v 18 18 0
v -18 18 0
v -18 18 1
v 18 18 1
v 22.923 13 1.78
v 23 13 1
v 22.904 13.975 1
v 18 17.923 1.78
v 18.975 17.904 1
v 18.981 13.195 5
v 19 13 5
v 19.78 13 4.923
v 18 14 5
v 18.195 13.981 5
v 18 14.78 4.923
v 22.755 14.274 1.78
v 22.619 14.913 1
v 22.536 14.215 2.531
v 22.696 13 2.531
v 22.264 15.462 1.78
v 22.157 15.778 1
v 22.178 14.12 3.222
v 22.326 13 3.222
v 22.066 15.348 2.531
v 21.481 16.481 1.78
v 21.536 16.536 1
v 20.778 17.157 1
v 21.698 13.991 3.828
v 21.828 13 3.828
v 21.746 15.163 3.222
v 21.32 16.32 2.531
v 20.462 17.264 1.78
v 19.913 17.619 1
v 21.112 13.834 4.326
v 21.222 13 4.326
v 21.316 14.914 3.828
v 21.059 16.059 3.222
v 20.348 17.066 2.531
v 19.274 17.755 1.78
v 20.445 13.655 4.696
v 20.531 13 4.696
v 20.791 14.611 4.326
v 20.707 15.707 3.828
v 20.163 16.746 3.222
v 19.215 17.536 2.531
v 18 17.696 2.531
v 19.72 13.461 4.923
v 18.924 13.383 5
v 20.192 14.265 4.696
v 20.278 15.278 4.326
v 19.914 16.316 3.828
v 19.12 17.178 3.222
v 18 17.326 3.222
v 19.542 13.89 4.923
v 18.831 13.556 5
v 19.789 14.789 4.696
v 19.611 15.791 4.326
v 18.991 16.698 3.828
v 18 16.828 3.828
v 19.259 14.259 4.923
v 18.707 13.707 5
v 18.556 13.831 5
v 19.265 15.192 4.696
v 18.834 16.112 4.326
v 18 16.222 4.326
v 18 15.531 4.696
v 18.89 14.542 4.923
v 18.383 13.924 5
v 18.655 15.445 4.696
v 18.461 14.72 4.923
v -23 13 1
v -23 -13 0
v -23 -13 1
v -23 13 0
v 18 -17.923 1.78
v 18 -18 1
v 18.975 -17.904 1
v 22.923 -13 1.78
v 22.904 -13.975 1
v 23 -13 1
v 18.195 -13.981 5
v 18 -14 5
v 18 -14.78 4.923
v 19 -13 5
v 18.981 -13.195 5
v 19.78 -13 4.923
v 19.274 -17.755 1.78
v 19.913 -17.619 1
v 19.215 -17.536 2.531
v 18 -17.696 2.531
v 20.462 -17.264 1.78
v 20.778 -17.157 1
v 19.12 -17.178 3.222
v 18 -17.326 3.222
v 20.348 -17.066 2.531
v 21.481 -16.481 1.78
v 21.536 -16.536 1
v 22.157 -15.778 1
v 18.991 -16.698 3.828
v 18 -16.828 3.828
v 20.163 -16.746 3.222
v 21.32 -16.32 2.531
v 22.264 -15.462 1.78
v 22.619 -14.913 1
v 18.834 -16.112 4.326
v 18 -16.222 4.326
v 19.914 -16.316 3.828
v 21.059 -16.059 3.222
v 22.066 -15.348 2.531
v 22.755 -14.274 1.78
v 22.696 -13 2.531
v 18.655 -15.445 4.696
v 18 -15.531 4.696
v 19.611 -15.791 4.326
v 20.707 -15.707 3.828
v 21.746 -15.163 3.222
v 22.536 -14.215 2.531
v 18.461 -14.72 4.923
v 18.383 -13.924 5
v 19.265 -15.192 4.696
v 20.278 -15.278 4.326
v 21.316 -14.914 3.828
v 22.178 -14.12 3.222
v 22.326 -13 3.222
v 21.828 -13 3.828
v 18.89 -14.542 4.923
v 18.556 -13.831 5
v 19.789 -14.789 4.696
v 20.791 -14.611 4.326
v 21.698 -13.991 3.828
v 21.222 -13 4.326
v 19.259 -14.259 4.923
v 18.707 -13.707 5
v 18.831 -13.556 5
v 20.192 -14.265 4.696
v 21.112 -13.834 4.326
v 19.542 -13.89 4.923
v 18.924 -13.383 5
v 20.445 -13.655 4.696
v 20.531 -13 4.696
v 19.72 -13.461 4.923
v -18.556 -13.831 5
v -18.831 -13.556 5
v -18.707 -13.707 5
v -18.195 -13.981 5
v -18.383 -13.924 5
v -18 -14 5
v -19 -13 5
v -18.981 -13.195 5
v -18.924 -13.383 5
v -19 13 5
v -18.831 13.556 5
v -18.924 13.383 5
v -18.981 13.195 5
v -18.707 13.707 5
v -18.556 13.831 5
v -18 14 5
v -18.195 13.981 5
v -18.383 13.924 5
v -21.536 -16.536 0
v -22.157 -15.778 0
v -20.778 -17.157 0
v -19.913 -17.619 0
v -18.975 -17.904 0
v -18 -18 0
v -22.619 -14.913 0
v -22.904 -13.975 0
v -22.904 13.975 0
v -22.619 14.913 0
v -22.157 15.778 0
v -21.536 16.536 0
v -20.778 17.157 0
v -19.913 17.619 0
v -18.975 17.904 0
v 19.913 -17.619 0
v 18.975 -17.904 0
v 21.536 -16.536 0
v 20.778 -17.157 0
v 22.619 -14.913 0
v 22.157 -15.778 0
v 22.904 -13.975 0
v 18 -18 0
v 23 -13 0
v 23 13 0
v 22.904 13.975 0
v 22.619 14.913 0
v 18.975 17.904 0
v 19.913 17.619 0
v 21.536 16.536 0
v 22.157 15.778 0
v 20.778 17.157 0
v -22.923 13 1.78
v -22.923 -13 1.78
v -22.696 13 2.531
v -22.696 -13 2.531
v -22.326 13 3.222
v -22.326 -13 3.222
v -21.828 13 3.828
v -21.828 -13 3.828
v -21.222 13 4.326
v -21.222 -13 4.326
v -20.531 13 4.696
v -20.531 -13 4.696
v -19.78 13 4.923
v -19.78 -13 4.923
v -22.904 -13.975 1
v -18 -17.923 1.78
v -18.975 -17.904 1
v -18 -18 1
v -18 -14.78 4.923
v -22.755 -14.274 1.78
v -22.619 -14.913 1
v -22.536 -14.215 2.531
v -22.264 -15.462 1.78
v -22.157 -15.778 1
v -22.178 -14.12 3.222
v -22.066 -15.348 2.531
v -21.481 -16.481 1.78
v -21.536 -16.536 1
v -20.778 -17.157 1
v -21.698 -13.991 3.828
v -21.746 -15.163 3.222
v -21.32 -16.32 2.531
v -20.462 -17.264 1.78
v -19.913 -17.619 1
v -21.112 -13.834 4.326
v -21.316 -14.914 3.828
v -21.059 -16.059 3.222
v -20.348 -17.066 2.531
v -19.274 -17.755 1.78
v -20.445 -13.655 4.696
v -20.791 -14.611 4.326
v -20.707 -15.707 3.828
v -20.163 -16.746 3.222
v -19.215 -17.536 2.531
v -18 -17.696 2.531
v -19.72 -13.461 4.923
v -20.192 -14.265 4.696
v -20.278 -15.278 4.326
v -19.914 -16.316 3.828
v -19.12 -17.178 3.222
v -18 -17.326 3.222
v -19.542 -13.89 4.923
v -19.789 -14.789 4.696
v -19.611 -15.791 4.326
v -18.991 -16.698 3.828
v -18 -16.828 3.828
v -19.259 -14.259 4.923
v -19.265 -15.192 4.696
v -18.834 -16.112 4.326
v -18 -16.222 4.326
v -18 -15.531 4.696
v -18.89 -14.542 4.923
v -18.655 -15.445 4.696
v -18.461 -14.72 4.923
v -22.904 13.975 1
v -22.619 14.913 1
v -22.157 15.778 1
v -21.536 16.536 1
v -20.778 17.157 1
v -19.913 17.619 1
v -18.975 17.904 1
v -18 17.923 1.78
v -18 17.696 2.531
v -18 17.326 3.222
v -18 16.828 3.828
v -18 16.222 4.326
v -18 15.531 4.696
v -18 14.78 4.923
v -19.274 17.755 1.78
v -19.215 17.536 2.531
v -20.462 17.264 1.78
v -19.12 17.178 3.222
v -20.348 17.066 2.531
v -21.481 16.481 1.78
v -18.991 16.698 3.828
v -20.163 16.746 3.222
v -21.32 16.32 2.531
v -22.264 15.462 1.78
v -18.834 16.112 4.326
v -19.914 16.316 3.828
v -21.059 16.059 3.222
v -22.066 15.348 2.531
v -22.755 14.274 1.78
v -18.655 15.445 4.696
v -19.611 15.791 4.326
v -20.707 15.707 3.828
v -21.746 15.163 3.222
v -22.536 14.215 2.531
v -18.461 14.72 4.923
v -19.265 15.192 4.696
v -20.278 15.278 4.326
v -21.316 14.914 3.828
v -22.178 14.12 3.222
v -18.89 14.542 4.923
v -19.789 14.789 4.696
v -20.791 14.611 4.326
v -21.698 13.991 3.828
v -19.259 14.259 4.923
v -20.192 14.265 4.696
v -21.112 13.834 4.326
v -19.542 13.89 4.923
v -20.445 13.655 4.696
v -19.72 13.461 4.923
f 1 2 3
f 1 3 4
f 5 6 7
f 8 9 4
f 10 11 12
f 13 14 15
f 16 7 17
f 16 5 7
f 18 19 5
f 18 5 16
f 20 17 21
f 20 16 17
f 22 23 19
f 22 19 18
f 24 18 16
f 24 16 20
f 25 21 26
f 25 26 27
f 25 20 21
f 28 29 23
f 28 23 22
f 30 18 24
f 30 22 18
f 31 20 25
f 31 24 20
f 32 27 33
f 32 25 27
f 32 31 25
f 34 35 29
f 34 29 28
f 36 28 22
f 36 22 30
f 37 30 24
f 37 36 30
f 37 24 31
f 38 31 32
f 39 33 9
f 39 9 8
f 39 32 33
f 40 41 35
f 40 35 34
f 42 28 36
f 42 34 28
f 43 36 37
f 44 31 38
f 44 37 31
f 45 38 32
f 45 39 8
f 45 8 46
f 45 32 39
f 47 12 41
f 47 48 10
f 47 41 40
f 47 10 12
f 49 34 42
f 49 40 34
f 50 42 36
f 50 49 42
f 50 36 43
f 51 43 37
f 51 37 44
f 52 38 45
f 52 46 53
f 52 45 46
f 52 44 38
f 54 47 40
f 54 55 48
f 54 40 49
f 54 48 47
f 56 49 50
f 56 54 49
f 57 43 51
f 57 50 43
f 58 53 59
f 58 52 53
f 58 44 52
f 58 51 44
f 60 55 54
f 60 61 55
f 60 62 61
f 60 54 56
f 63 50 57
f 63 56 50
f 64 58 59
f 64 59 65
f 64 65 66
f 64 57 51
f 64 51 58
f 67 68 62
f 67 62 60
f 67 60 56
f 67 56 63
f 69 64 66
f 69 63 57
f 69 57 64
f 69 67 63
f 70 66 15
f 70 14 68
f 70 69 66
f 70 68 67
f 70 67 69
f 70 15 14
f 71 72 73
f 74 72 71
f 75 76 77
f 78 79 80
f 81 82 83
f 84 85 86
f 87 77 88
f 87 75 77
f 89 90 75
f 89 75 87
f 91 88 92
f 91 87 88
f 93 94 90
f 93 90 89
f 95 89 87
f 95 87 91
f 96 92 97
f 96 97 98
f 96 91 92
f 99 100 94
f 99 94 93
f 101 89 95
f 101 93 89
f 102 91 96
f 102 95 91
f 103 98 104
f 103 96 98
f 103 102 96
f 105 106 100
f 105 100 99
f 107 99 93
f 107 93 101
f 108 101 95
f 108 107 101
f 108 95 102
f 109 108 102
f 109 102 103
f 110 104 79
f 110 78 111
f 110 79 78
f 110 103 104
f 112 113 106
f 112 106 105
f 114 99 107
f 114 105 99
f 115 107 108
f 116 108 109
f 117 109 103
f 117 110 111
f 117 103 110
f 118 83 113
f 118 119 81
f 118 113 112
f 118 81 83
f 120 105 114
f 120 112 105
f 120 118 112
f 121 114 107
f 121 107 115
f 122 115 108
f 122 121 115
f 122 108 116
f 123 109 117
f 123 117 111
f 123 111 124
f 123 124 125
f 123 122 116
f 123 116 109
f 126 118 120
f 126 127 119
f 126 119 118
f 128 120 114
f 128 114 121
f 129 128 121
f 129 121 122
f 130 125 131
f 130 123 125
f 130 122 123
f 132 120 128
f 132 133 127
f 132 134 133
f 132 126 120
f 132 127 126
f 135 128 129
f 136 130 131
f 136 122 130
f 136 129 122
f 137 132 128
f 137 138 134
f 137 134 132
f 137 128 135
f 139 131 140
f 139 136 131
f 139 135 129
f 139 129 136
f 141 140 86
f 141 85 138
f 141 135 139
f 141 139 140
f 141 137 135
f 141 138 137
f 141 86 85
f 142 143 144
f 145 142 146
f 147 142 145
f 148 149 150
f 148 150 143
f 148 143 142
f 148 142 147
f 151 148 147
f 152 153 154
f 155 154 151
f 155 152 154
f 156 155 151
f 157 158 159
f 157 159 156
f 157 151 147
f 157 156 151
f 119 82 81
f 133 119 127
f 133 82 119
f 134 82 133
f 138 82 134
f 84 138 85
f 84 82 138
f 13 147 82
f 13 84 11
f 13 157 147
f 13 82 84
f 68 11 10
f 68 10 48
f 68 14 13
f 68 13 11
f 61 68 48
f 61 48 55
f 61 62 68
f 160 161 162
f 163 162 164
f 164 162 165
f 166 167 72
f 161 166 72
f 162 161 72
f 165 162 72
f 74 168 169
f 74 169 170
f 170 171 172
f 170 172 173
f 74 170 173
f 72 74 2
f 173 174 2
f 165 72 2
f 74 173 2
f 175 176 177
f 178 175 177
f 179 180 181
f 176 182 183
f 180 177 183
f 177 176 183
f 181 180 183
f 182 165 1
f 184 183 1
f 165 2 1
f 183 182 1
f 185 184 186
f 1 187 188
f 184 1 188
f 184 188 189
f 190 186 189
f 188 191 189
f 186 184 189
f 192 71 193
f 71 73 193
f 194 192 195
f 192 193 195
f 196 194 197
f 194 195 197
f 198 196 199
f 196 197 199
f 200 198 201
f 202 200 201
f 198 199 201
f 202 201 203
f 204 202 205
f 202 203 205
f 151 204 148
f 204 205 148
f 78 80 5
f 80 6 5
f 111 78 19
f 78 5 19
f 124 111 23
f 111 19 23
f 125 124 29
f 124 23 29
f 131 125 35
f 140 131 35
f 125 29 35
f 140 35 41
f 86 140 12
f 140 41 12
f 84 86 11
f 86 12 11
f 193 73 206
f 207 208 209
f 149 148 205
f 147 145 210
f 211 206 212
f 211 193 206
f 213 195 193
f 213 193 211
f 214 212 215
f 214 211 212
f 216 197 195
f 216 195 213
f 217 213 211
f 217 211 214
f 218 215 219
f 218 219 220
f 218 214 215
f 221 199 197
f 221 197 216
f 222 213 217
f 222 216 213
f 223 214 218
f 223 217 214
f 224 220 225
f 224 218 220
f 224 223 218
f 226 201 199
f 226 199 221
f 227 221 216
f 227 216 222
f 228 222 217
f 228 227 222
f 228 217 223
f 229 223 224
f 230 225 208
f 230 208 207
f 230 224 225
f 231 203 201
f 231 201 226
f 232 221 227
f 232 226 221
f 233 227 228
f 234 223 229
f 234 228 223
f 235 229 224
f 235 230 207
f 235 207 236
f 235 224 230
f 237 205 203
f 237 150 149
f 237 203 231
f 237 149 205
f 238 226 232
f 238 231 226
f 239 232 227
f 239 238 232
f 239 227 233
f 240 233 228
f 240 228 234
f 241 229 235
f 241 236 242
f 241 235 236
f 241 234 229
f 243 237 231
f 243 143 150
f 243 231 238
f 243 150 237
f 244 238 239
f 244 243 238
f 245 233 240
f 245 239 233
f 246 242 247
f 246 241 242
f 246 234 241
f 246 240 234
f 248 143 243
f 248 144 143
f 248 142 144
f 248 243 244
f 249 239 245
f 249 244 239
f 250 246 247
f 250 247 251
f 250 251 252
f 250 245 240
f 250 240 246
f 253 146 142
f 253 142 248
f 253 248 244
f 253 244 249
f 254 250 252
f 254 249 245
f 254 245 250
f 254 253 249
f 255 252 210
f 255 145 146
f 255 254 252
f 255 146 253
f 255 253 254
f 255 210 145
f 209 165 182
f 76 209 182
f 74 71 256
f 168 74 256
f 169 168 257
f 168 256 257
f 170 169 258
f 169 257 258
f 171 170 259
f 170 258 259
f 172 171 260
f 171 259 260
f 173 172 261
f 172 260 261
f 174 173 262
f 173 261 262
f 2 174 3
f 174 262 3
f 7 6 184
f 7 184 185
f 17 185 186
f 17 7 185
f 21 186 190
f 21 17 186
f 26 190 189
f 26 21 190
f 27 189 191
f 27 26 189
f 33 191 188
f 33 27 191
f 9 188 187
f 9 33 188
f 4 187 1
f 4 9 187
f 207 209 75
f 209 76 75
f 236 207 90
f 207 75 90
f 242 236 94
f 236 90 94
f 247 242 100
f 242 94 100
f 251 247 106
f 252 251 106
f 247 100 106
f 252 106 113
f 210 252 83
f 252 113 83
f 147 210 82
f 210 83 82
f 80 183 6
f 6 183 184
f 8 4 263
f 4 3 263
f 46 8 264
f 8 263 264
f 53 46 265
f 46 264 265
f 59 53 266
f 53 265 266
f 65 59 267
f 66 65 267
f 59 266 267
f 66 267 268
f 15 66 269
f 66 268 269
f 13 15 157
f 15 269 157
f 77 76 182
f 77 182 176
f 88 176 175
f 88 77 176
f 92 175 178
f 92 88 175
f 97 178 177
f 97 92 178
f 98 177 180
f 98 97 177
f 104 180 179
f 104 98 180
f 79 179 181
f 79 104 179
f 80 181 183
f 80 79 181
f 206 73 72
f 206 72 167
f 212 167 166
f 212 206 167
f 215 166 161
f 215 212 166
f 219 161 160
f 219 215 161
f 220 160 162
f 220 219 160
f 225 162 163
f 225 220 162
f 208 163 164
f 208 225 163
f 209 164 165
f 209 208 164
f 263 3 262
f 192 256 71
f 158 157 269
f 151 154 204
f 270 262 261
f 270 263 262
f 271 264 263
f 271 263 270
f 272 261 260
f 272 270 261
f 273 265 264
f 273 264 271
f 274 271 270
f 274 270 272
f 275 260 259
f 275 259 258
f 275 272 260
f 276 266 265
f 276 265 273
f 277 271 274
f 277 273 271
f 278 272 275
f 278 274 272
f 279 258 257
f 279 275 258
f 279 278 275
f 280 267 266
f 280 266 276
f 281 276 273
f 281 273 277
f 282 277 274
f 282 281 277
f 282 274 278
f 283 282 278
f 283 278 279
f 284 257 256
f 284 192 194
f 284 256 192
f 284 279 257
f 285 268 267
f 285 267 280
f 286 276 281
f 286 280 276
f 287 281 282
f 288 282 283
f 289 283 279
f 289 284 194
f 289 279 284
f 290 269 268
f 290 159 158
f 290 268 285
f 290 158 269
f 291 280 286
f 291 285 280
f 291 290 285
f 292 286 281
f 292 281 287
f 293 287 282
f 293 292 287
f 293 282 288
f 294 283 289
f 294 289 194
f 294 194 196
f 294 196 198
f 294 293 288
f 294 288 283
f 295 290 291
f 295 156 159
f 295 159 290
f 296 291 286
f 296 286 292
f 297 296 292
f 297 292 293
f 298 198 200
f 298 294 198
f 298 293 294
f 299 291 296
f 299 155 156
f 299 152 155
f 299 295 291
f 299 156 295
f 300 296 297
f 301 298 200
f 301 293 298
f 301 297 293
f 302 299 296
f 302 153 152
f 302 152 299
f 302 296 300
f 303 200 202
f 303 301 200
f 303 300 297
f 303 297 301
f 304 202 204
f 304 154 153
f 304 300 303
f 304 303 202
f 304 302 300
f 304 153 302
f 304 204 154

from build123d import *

# Parameters (mm, degrees)
SKETCH_W    = 46
SKETCH_H    = 36
PAD_DEPTH   = 5
FILLET_R    = 5
FILLET001_R = 5
FILLET002_R = 4


with BuildPart() as part:
    # Sketch → Pad (new body)
    with BuildSketch(Plane.XY):
        Rectangle(SKETCH_W, SKETCH_H)
    extrude(amount=PAD_DEPTH)

    # Fillet
    fillet_edges = [part.edges().sort_by_distance(p)[0] for p in [
        (23, -18, 2.5),
        (23, 18, 2.5),
        (-23, -18, 2.5),
    ]]
    fillet(fillet_edges, radius=FILLET_R)

    # Fillet001
    fillet001_edges = [part.edges().sort_by_distance(p)[0] for p in [
        (-23, 18, 2.5),
    ]]
    fillet(fillet001_edges, radius=FILLET001_R)

    # Fillet002
    fillet002_edges = [part.edges().sort_by_distance(p)[0] for p in [
        (-21.535534, -16.535534, 5),
        (21.535534, -16.535534, 5),
        (0, -18, 5),
        (23, 0, 5),
        (21.535534, 16.535534, 5),
        (0, 18, 5),
        (-21.535534, 16.535534, 5),
        (-23, 0, 5),
    ]]
    fillet(fillet002_edges, radius=FILLET002_R)


solid = part.part
